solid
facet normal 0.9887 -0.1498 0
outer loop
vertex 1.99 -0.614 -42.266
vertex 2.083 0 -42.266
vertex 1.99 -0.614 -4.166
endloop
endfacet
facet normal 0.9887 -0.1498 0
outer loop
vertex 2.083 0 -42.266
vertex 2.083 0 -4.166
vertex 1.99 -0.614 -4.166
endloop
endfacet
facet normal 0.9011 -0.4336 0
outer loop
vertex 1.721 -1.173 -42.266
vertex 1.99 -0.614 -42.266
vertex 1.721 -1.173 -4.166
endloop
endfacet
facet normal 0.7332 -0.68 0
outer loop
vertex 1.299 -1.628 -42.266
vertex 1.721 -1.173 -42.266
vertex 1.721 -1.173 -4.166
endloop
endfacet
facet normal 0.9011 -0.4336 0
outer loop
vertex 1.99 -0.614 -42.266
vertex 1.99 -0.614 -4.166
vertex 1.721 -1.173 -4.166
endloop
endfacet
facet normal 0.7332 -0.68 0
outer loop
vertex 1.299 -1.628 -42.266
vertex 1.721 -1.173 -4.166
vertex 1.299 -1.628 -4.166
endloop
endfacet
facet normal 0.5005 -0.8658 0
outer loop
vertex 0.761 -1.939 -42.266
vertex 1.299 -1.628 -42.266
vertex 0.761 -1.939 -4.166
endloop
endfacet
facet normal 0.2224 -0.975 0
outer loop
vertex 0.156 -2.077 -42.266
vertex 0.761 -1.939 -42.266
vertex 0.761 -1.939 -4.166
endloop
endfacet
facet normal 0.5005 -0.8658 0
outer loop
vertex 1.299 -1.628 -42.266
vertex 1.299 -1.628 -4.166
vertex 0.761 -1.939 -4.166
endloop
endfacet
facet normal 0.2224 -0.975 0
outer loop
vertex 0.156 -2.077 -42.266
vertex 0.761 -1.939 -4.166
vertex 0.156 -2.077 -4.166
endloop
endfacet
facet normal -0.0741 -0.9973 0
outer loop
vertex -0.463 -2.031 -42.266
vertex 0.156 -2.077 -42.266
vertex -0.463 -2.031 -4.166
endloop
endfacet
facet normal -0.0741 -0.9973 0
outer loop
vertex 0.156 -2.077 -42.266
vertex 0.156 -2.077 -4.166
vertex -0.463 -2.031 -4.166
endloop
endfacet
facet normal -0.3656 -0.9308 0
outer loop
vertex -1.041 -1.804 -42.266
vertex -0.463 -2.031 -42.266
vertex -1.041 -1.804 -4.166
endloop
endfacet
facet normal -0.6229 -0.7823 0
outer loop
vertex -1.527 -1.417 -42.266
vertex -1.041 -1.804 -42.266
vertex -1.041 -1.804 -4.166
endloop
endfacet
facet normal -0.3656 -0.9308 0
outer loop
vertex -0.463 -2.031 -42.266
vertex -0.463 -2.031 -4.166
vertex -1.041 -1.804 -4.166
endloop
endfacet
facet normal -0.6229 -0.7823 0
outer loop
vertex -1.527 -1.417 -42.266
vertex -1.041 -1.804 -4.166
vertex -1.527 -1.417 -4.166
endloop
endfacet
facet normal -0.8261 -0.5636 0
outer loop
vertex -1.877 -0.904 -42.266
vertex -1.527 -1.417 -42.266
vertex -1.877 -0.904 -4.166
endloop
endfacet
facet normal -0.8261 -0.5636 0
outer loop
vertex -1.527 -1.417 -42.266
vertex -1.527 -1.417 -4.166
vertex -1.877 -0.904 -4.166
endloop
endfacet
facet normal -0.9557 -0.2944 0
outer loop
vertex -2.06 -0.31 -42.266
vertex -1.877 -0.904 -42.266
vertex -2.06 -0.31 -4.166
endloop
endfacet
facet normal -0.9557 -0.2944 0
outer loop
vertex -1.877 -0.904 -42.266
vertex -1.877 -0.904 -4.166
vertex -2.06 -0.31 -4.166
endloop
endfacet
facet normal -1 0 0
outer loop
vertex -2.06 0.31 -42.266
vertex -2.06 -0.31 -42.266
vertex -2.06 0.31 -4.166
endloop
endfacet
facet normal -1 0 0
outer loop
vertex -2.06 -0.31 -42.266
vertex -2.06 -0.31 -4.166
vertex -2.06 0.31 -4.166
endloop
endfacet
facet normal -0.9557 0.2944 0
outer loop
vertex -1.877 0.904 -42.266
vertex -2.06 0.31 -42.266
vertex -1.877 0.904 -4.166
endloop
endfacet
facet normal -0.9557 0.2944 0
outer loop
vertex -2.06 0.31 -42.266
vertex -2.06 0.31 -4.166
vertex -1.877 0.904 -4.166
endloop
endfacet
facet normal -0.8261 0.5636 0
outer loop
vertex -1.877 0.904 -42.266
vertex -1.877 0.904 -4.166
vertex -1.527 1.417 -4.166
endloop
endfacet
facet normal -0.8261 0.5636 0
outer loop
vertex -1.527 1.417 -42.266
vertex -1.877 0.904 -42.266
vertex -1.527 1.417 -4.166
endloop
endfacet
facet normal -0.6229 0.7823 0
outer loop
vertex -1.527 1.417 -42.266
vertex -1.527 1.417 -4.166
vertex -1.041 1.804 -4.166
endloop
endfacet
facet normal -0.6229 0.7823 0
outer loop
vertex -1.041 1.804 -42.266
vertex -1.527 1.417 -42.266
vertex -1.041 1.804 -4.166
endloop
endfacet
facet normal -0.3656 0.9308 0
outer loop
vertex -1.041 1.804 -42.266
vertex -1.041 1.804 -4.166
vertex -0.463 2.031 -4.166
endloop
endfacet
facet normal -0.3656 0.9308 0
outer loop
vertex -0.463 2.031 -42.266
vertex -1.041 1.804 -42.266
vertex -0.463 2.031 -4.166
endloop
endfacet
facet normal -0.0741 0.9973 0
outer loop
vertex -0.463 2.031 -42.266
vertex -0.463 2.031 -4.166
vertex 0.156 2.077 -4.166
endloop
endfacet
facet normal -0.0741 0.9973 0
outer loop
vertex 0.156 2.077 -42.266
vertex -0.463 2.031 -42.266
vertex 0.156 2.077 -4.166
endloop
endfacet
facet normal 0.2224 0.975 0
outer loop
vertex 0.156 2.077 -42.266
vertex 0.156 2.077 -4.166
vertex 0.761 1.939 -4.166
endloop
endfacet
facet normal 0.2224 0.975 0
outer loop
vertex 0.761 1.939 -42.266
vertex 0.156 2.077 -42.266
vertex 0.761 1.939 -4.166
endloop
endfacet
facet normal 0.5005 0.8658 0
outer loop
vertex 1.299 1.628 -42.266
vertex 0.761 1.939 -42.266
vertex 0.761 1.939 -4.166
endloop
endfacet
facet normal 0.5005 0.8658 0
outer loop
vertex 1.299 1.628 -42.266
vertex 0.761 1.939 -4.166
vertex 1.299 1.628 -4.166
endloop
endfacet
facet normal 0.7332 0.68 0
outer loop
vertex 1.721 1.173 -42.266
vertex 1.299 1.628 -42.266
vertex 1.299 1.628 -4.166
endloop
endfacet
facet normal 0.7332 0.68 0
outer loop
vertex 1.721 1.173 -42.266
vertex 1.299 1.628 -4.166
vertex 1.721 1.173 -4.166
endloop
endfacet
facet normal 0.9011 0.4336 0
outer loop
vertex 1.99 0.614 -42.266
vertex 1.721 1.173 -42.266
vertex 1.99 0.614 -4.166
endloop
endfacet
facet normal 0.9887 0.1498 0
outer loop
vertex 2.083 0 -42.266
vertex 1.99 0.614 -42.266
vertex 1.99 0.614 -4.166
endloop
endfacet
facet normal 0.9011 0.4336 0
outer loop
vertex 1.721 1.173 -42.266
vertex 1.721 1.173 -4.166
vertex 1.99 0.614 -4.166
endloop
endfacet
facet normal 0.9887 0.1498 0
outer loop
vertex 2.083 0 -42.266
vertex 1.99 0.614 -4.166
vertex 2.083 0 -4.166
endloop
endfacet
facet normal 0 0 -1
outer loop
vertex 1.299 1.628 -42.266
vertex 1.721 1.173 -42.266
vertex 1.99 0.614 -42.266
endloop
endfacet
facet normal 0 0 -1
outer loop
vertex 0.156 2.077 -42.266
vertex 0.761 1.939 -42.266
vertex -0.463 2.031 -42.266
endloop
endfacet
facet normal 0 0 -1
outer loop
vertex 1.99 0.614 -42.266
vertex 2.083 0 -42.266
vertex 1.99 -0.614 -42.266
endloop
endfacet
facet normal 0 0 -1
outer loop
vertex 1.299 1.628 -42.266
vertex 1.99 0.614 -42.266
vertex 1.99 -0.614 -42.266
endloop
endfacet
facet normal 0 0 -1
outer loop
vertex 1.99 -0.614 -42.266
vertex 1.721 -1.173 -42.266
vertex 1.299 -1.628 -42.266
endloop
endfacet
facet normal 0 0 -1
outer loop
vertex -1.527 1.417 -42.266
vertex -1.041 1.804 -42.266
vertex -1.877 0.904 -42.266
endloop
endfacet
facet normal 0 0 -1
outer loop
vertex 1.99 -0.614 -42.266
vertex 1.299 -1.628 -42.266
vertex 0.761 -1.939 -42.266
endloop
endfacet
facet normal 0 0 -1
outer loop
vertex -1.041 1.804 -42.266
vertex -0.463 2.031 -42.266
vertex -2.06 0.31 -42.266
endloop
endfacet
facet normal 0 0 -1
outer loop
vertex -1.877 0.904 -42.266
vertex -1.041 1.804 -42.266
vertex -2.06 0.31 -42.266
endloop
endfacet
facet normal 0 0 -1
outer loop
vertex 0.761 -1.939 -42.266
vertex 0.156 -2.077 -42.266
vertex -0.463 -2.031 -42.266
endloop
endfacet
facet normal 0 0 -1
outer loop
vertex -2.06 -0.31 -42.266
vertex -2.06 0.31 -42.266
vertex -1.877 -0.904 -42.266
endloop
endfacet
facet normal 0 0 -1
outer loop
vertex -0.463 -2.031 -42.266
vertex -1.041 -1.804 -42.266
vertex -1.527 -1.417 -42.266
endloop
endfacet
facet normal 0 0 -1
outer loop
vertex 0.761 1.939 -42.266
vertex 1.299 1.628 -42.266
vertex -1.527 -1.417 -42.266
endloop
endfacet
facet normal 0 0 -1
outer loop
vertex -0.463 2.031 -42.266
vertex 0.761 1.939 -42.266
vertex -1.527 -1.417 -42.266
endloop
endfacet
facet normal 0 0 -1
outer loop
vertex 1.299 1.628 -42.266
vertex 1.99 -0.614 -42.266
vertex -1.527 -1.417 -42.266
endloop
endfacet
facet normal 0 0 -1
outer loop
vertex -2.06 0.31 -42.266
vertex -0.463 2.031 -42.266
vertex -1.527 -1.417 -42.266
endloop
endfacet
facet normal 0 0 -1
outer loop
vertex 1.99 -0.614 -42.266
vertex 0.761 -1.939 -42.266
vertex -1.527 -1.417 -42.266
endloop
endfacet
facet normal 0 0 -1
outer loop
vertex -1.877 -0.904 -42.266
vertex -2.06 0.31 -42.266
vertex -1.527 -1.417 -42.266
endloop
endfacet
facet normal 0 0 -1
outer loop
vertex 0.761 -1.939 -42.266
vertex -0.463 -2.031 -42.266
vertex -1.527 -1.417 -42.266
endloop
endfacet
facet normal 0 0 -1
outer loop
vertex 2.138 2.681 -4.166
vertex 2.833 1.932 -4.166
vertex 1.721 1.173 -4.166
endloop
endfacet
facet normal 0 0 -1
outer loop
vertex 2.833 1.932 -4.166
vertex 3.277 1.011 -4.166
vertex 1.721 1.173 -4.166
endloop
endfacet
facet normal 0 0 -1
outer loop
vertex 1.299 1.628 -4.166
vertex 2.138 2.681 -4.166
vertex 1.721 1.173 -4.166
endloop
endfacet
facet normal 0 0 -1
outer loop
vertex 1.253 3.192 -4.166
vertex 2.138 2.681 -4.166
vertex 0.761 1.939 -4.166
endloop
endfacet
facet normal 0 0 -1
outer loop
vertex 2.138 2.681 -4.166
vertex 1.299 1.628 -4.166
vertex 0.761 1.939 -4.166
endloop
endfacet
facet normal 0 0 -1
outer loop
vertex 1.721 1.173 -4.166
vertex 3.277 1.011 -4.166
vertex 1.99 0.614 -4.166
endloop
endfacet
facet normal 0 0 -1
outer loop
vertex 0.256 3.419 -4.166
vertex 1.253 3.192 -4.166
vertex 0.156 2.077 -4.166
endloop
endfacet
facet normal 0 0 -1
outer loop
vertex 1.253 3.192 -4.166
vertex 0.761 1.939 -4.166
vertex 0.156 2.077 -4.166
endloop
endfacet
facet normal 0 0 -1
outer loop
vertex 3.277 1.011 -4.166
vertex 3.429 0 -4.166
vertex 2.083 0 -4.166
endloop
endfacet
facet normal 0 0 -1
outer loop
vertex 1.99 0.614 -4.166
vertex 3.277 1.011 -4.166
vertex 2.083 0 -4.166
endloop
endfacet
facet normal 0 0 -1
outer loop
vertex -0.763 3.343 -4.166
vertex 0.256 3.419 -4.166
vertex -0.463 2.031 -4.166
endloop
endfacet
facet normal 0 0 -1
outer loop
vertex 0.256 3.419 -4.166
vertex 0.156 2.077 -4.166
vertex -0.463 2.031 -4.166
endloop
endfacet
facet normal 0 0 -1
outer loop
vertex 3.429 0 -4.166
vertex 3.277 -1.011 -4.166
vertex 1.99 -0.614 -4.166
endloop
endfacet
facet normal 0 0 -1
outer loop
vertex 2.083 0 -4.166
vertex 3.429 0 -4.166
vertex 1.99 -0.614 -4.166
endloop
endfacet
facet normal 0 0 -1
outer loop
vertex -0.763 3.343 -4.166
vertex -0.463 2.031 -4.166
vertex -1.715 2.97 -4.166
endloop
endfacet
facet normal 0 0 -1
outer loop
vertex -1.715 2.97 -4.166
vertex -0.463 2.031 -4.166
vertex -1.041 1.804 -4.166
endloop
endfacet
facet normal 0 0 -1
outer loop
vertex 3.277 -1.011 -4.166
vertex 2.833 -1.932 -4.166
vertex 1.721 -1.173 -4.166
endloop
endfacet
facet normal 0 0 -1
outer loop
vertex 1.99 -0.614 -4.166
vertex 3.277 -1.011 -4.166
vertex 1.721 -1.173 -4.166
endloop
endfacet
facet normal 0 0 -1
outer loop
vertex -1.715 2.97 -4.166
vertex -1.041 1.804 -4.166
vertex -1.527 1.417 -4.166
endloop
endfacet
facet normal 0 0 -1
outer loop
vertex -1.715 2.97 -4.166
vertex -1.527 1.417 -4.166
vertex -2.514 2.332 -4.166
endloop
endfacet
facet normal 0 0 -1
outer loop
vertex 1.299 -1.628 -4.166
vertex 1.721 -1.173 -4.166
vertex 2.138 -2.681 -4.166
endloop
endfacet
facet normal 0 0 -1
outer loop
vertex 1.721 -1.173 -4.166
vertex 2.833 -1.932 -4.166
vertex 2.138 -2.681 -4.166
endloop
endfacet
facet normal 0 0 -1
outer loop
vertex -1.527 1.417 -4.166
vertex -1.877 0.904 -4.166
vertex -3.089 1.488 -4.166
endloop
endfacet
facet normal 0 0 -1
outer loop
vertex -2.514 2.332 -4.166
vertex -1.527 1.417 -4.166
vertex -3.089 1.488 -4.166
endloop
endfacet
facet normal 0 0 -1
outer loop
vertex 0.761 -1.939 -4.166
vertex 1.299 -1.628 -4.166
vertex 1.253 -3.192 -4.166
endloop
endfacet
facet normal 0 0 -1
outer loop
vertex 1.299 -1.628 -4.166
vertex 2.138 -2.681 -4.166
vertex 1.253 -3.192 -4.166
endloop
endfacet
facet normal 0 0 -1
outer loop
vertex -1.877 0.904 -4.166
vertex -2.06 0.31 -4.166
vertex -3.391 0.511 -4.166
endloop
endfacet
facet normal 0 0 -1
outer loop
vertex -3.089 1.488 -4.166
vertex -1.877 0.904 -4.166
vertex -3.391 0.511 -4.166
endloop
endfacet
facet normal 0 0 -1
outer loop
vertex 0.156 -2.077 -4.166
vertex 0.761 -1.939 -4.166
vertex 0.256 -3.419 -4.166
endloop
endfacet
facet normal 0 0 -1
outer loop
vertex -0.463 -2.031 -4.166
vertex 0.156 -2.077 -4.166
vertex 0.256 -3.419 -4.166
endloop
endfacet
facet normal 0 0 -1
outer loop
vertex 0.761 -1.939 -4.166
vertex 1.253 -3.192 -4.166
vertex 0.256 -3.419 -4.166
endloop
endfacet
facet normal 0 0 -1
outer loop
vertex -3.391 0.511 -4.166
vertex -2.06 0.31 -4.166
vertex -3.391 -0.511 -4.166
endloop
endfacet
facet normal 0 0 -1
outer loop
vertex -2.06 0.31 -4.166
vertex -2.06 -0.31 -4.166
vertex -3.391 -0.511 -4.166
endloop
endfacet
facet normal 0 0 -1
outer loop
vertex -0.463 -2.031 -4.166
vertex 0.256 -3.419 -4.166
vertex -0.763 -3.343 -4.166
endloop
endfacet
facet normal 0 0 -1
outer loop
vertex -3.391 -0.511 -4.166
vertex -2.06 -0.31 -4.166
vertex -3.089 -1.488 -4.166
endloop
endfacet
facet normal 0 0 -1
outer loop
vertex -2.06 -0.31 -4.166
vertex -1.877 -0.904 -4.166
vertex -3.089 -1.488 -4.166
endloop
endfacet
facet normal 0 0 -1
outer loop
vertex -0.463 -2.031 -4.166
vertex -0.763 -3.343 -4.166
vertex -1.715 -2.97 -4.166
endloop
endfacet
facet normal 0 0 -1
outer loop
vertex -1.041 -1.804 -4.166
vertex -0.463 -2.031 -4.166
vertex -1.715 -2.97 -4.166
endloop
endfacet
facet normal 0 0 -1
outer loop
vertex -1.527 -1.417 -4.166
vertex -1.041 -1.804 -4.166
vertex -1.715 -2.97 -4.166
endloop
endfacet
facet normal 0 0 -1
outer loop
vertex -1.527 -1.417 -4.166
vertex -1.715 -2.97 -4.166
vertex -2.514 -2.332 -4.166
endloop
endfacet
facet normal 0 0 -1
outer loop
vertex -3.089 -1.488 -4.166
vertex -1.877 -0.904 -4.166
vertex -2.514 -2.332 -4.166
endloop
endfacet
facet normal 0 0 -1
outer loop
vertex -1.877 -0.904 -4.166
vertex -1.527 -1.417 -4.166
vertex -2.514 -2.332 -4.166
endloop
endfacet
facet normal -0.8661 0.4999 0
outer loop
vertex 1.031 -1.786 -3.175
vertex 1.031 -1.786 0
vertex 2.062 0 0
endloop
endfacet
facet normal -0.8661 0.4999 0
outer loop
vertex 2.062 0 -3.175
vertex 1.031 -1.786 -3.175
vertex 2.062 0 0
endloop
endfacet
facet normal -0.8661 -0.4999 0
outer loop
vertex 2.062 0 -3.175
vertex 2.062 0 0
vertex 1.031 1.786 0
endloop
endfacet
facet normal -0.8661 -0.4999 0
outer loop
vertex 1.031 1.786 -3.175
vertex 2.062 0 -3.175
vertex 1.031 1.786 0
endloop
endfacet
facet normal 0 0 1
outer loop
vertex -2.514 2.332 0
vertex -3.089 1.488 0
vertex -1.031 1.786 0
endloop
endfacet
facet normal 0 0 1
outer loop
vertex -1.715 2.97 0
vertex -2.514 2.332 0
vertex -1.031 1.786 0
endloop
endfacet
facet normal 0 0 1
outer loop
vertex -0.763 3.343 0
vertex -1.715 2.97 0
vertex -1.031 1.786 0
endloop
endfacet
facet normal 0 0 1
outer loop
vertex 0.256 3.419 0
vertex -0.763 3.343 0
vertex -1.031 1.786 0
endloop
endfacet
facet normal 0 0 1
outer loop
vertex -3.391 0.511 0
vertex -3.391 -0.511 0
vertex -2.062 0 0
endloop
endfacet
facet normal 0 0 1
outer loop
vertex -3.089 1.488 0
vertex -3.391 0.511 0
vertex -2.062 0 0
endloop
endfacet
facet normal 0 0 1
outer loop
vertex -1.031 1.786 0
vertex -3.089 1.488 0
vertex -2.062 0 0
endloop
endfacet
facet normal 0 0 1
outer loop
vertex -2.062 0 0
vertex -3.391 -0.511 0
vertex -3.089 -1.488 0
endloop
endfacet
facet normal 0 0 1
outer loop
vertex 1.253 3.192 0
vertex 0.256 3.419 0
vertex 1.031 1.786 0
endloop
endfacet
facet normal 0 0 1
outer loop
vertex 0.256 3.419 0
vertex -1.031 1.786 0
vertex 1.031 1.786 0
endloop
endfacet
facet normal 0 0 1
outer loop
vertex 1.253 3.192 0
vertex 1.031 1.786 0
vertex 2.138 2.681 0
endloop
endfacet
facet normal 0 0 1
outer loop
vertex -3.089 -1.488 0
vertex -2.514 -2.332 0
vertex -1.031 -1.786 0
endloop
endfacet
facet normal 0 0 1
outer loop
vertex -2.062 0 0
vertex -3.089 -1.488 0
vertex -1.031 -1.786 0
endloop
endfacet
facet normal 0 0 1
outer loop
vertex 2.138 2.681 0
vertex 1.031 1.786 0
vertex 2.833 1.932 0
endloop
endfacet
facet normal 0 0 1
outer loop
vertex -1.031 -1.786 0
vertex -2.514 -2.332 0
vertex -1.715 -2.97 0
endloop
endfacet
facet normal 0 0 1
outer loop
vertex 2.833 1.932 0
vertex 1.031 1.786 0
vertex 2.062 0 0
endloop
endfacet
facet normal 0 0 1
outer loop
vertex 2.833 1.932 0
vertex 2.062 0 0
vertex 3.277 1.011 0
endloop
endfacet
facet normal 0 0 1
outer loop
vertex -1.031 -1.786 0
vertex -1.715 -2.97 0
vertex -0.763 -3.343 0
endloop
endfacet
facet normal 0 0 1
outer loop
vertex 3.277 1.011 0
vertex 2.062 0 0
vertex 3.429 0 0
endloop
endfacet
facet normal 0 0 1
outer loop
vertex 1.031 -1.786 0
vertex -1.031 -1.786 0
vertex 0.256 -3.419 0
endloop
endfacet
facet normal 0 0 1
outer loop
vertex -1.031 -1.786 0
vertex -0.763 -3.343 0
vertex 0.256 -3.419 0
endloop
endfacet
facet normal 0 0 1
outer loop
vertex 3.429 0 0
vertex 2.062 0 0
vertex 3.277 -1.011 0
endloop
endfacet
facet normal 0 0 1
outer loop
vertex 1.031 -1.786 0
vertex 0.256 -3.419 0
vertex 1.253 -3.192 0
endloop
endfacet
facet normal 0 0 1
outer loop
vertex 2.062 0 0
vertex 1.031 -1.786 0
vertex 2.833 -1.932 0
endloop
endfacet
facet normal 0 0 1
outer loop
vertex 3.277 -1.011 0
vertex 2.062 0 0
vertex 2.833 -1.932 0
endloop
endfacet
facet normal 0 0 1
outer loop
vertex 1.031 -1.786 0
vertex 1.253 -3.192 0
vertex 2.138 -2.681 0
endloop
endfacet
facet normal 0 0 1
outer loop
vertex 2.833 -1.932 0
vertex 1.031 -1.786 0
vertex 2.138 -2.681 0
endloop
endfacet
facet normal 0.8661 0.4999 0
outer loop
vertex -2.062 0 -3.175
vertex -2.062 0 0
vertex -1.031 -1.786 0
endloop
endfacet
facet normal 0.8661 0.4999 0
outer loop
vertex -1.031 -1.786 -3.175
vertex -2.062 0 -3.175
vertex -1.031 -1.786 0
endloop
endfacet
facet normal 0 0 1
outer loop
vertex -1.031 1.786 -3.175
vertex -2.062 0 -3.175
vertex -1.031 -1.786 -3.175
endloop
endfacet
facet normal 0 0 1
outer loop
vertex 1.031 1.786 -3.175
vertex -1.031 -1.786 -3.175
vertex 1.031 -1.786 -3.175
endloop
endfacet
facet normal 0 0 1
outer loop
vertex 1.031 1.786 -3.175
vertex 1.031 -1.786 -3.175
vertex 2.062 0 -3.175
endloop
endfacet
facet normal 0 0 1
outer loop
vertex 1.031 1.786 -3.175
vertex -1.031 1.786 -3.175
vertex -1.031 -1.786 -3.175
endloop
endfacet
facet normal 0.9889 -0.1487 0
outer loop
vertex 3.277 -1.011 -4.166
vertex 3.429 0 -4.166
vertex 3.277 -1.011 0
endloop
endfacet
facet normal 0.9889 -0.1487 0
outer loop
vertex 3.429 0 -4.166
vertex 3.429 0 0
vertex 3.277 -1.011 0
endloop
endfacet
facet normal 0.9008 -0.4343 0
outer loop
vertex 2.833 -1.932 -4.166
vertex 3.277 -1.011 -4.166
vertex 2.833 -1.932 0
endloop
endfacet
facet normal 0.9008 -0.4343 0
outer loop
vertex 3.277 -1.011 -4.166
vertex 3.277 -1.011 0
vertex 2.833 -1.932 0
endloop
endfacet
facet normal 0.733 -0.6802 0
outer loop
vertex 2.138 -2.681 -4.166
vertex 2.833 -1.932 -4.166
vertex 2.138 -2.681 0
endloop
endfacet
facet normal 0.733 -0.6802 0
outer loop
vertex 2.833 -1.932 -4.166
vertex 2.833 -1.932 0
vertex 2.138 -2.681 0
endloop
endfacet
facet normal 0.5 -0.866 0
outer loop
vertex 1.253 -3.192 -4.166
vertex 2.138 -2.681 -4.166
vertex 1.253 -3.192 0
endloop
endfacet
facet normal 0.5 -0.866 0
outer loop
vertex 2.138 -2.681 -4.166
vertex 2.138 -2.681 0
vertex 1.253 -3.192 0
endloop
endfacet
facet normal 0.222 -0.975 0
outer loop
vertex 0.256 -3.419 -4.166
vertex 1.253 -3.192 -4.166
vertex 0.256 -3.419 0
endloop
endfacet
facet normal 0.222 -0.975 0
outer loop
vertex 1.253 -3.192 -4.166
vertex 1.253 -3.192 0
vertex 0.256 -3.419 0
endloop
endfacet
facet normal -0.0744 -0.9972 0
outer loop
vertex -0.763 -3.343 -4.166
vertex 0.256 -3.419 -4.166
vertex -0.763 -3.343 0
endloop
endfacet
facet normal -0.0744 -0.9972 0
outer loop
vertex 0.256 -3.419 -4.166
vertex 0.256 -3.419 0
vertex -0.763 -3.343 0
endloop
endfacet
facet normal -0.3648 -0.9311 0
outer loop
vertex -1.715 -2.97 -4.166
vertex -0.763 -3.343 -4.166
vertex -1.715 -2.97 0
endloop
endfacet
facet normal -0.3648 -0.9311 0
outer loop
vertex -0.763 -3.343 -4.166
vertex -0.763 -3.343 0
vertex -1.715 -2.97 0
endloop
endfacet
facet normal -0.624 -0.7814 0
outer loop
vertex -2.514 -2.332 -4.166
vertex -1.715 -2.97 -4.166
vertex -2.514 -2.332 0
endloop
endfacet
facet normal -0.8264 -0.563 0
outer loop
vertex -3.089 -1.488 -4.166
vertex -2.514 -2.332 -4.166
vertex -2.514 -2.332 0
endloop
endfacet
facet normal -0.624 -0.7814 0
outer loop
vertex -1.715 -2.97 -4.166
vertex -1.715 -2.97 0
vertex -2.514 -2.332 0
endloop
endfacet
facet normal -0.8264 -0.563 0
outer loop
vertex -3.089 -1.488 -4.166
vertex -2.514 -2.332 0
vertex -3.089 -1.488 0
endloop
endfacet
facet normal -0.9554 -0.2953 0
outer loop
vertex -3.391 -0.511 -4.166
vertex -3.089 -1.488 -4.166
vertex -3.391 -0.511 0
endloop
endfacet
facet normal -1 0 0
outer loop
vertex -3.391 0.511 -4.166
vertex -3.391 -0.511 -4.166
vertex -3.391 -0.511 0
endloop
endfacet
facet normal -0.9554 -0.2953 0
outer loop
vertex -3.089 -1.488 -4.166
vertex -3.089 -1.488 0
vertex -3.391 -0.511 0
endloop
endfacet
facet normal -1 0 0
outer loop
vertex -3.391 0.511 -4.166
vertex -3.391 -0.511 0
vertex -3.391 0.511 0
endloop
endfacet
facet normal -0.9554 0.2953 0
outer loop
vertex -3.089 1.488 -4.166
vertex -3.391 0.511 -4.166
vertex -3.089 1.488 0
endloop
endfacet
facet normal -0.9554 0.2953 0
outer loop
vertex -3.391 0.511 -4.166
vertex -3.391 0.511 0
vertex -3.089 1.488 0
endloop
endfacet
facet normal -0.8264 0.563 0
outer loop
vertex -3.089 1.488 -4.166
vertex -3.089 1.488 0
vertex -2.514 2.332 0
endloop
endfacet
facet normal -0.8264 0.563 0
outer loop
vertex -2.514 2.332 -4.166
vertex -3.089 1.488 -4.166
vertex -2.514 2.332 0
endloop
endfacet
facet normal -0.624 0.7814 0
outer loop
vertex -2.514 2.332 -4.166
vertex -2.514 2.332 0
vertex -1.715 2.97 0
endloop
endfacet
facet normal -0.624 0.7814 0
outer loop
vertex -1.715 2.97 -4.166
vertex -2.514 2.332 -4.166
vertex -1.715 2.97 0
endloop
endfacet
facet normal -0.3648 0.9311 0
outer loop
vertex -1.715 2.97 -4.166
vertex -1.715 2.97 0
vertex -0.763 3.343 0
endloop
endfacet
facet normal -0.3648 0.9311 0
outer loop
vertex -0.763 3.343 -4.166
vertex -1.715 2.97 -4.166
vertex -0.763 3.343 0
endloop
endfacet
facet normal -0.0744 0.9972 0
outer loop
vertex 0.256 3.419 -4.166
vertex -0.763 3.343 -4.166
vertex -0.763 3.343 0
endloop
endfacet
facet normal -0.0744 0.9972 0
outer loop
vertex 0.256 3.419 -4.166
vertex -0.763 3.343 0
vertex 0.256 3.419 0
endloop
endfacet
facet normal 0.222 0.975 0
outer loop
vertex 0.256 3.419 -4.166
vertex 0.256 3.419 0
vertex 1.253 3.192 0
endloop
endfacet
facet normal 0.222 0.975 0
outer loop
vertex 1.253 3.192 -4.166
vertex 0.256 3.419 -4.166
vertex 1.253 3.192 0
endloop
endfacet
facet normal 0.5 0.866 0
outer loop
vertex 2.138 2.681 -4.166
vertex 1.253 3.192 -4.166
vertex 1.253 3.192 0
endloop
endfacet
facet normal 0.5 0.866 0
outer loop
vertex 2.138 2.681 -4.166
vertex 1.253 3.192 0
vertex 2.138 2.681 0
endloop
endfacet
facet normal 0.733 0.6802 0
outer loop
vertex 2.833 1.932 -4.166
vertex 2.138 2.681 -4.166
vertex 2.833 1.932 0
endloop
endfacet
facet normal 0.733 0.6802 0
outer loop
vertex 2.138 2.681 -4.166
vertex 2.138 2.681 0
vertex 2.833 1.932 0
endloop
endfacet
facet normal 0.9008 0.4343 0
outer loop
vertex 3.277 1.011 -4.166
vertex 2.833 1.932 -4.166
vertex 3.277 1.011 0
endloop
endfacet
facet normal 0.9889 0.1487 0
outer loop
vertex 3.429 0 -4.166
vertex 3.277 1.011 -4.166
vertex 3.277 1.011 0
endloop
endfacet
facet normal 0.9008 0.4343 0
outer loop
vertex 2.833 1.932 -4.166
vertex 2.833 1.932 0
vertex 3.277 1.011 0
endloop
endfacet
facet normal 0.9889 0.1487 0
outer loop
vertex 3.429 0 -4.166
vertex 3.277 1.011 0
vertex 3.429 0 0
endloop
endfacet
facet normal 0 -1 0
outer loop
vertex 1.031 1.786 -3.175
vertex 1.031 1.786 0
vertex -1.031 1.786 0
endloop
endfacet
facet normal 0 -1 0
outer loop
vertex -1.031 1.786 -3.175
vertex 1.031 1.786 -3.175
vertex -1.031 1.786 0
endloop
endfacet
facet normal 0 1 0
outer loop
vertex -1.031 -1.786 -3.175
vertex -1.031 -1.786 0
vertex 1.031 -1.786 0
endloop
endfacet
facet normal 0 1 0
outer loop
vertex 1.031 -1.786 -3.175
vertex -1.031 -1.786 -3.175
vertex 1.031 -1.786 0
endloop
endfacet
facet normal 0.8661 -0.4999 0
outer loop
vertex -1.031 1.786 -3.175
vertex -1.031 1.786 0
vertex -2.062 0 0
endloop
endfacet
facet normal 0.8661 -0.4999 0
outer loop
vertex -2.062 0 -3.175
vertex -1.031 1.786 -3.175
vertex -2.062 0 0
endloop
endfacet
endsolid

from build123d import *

# Parameters (mm, degrees)
F_9_64_ALLEN_DEPTH = 3.175


with BuildPart() as part:
    # Sketch1 → Revolve1 (revolve)
    with BuildSketch(Plane(origin=(0, 0, 0), x_dir=(1, 0, 0), z_dir=(0, 1, 0))):
        Polygon((0, 0), (0, 42.2656), (2.0828, 42.2656), (2.0828, 4.1656), (3.429, 4.1656), (3.429, 0), align=None)
    revolve(axis=Axis((0, 0, 0), (0, 0, -1)))

    # Sketch2 → 9-64 allen (cut)
    with BuildSketch(Plane.XY):
        Polygon((2.062222993, 0), (1.031111496, 1.7859375), (-1.031111496, 1.7859375), (-2.062222993, 0), (-1.031111496, -1.7859375), (1.031111496, -1.7859375), align=None)
    extrude(amount=-F_9_64_ALLEN_DEPTH, mode=Mode.SUBTRACT)


solid = part.part
